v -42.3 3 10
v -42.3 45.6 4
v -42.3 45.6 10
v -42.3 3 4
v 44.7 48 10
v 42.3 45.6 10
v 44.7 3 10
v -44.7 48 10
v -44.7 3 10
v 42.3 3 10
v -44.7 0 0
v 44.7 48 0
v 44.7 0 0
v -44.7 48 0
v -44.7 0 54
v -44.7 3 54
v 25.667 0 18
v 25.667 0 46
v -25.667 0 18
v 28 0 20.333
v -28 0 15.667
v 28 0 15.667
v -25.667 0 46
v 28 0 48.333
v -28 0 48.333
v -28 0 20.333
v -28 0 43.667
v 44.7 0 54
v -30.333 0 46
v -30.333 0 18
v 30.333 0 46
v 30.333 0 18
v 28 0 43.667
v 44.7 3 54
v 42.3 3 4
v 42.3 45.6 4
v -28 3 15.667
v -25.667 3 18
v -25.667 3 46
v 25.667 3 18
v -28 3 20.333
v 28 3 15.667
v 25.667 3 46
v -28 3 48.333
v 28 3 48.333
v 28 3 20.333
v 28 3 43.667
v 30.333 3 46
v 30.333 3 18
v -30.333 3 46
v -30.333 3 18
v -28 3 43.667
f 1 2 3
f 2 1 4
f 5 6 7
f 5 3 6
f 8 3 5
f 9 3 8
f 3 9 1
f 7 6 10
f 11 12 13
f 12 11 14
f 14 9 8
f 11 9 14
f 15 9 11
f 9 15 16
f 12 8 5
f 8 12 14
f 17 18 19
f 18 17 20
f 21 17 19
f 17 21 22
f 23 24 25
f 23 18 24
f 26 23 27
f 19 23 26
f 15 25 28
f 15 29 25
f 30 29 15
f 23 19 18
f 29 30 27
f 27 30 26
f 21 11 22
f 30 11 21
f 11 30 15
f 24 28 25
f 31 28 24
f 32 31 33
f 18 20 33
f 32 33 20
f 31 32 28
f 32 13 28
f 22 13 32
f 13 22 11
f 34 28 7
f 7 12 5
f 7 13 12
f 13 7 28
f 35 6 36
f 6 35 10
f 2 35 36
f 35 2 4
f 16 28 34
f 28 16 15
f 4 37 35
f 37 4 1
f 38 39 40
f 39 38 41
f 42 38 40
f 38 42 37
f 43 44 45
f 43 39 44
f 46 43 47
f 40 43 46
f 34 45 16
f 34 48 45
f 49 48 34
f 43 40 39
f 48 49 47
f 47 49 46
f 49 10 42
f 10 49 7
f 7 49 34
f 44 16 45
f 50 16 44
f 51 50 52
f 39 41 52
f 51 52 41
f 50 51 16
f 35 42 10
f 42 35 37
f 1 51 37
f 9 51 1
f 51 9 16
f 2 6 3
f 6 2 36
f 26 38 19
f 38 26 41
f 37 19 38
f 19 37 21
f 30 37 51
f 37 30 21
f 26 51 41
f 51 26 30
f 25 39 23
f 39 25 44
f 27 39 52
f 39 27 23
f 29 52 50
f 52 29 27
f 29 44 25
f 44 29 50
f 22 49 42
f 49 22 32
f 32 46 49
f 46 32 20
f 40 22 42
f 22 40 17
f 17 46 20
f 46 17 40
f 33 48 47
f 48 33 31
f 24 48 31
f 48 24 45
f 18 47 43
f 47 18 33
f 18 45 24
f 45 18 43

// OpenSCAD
// openGrid tray shelf for Gridfinity bins; all dimensions in mm.
// Print as shown, flat underside at Z=0, open tray upward, without supports.
// Four M3 screws/washers and four directional M3 metric screw snaps required.
// Mount the rear face (Y=0) to the board, arrows on the snaps upward. Lite
// boards are 4 mm, Full boards 6.8 mm: use matching snaps and screw lengths.
// Engagement = screw length - back thickness - washer thickness. M3x6 with
// the default back and a 0.5 mm washer engages 2.5 mm. Check snap thread depth.
// This is a flat shelf with retaining rails, not a Gridfinity locking socket.
// Original geometry from published pitches: 3 x 28 = 2 x 42 = 84 mm.
// openGrid by David D, CC BY 4.0 core parts: https://www.opengrid.world/guides/
// Dimensions: https://www.opengrid.world/guides/board/
// Hardware: https://www.opengrid.world/guides/snaps/
// Katie's library: https://handsonkatie.com/home-organisation-library/?_system=opengrid
// For light bins; physical fit and load capacity are not yet tested.

// Shelf width in 42 mm Gridfinity units (count).
bin_units = 2; // [2:1:4]
// Shelf depth in 42 mm Gridfinity units (count).
depth_units = 1; // [1:1:2]
// Flat shelf thickness (mm).
floor_thickness = 4; // [3:0.5:6]
// Side and front rail thickness (mm).
rail_thickness = 2.4; // [1.6:0.4:4]
// Rail height above the shelf floor (mm).
rail_height = 6; // [4:1:12]
// Back thickness; affects the required screw length (mm).
back_thickness = 3; // [3:0.5:5]
// Bin clearance per side; also extra screw bore diameter (mm).
tolerance = 0.3; // [0.2:0.05:0.4]

/* [Hidden] */
pitch = 28;
bin_pitch = 42;
inner_width = bin_units * bin_pitch + 2 * tolerance;
inner_depth = depth_units * bin_pitch + 2 * tolerance;
width = inner_width + 2 * rail_thickness;
depth = inner_depth + back_thickness + rail_thickness;
hole_z = floor_thickness + rail_height + 8;
back_height = hole_z + pitch + 8;
mount_x = floor((width - 16) / (2 * pitch)) * pitch;
eps = 0.02;

color("#55a9e8") difference() {
    union() {
        translate([-width / 2, 0, 0]) cube([width, depth, floor_thickness]);
        translate([-width / 2, 0, 0]) cube([width, back_thickness, back_height]);
        for (x = [-width / 2, width / 2 - rail_thickness])
            translate([x, 0, 0])
                cube([rail_thickness, depth, floor_thickness + rail_height]);
        translate([-width / 2, depth - rail_thickness, 0])
            cube([width, rail_thickness, floor_thickness + rail_height]);
    }
    // A rotated square bore prints its roof at 45 degrees, without bridging.
    for (x = [-mount_x, mount_x])
        for (z = [hole_z, hole_z + pitch])
            translate([x, back_thickness / 2, z])
                rotate([0, 45, 0])
                    cube([3 + tolerance, back_thickness + 2 * eps,
                          3 + tolerance], center = true);
}
